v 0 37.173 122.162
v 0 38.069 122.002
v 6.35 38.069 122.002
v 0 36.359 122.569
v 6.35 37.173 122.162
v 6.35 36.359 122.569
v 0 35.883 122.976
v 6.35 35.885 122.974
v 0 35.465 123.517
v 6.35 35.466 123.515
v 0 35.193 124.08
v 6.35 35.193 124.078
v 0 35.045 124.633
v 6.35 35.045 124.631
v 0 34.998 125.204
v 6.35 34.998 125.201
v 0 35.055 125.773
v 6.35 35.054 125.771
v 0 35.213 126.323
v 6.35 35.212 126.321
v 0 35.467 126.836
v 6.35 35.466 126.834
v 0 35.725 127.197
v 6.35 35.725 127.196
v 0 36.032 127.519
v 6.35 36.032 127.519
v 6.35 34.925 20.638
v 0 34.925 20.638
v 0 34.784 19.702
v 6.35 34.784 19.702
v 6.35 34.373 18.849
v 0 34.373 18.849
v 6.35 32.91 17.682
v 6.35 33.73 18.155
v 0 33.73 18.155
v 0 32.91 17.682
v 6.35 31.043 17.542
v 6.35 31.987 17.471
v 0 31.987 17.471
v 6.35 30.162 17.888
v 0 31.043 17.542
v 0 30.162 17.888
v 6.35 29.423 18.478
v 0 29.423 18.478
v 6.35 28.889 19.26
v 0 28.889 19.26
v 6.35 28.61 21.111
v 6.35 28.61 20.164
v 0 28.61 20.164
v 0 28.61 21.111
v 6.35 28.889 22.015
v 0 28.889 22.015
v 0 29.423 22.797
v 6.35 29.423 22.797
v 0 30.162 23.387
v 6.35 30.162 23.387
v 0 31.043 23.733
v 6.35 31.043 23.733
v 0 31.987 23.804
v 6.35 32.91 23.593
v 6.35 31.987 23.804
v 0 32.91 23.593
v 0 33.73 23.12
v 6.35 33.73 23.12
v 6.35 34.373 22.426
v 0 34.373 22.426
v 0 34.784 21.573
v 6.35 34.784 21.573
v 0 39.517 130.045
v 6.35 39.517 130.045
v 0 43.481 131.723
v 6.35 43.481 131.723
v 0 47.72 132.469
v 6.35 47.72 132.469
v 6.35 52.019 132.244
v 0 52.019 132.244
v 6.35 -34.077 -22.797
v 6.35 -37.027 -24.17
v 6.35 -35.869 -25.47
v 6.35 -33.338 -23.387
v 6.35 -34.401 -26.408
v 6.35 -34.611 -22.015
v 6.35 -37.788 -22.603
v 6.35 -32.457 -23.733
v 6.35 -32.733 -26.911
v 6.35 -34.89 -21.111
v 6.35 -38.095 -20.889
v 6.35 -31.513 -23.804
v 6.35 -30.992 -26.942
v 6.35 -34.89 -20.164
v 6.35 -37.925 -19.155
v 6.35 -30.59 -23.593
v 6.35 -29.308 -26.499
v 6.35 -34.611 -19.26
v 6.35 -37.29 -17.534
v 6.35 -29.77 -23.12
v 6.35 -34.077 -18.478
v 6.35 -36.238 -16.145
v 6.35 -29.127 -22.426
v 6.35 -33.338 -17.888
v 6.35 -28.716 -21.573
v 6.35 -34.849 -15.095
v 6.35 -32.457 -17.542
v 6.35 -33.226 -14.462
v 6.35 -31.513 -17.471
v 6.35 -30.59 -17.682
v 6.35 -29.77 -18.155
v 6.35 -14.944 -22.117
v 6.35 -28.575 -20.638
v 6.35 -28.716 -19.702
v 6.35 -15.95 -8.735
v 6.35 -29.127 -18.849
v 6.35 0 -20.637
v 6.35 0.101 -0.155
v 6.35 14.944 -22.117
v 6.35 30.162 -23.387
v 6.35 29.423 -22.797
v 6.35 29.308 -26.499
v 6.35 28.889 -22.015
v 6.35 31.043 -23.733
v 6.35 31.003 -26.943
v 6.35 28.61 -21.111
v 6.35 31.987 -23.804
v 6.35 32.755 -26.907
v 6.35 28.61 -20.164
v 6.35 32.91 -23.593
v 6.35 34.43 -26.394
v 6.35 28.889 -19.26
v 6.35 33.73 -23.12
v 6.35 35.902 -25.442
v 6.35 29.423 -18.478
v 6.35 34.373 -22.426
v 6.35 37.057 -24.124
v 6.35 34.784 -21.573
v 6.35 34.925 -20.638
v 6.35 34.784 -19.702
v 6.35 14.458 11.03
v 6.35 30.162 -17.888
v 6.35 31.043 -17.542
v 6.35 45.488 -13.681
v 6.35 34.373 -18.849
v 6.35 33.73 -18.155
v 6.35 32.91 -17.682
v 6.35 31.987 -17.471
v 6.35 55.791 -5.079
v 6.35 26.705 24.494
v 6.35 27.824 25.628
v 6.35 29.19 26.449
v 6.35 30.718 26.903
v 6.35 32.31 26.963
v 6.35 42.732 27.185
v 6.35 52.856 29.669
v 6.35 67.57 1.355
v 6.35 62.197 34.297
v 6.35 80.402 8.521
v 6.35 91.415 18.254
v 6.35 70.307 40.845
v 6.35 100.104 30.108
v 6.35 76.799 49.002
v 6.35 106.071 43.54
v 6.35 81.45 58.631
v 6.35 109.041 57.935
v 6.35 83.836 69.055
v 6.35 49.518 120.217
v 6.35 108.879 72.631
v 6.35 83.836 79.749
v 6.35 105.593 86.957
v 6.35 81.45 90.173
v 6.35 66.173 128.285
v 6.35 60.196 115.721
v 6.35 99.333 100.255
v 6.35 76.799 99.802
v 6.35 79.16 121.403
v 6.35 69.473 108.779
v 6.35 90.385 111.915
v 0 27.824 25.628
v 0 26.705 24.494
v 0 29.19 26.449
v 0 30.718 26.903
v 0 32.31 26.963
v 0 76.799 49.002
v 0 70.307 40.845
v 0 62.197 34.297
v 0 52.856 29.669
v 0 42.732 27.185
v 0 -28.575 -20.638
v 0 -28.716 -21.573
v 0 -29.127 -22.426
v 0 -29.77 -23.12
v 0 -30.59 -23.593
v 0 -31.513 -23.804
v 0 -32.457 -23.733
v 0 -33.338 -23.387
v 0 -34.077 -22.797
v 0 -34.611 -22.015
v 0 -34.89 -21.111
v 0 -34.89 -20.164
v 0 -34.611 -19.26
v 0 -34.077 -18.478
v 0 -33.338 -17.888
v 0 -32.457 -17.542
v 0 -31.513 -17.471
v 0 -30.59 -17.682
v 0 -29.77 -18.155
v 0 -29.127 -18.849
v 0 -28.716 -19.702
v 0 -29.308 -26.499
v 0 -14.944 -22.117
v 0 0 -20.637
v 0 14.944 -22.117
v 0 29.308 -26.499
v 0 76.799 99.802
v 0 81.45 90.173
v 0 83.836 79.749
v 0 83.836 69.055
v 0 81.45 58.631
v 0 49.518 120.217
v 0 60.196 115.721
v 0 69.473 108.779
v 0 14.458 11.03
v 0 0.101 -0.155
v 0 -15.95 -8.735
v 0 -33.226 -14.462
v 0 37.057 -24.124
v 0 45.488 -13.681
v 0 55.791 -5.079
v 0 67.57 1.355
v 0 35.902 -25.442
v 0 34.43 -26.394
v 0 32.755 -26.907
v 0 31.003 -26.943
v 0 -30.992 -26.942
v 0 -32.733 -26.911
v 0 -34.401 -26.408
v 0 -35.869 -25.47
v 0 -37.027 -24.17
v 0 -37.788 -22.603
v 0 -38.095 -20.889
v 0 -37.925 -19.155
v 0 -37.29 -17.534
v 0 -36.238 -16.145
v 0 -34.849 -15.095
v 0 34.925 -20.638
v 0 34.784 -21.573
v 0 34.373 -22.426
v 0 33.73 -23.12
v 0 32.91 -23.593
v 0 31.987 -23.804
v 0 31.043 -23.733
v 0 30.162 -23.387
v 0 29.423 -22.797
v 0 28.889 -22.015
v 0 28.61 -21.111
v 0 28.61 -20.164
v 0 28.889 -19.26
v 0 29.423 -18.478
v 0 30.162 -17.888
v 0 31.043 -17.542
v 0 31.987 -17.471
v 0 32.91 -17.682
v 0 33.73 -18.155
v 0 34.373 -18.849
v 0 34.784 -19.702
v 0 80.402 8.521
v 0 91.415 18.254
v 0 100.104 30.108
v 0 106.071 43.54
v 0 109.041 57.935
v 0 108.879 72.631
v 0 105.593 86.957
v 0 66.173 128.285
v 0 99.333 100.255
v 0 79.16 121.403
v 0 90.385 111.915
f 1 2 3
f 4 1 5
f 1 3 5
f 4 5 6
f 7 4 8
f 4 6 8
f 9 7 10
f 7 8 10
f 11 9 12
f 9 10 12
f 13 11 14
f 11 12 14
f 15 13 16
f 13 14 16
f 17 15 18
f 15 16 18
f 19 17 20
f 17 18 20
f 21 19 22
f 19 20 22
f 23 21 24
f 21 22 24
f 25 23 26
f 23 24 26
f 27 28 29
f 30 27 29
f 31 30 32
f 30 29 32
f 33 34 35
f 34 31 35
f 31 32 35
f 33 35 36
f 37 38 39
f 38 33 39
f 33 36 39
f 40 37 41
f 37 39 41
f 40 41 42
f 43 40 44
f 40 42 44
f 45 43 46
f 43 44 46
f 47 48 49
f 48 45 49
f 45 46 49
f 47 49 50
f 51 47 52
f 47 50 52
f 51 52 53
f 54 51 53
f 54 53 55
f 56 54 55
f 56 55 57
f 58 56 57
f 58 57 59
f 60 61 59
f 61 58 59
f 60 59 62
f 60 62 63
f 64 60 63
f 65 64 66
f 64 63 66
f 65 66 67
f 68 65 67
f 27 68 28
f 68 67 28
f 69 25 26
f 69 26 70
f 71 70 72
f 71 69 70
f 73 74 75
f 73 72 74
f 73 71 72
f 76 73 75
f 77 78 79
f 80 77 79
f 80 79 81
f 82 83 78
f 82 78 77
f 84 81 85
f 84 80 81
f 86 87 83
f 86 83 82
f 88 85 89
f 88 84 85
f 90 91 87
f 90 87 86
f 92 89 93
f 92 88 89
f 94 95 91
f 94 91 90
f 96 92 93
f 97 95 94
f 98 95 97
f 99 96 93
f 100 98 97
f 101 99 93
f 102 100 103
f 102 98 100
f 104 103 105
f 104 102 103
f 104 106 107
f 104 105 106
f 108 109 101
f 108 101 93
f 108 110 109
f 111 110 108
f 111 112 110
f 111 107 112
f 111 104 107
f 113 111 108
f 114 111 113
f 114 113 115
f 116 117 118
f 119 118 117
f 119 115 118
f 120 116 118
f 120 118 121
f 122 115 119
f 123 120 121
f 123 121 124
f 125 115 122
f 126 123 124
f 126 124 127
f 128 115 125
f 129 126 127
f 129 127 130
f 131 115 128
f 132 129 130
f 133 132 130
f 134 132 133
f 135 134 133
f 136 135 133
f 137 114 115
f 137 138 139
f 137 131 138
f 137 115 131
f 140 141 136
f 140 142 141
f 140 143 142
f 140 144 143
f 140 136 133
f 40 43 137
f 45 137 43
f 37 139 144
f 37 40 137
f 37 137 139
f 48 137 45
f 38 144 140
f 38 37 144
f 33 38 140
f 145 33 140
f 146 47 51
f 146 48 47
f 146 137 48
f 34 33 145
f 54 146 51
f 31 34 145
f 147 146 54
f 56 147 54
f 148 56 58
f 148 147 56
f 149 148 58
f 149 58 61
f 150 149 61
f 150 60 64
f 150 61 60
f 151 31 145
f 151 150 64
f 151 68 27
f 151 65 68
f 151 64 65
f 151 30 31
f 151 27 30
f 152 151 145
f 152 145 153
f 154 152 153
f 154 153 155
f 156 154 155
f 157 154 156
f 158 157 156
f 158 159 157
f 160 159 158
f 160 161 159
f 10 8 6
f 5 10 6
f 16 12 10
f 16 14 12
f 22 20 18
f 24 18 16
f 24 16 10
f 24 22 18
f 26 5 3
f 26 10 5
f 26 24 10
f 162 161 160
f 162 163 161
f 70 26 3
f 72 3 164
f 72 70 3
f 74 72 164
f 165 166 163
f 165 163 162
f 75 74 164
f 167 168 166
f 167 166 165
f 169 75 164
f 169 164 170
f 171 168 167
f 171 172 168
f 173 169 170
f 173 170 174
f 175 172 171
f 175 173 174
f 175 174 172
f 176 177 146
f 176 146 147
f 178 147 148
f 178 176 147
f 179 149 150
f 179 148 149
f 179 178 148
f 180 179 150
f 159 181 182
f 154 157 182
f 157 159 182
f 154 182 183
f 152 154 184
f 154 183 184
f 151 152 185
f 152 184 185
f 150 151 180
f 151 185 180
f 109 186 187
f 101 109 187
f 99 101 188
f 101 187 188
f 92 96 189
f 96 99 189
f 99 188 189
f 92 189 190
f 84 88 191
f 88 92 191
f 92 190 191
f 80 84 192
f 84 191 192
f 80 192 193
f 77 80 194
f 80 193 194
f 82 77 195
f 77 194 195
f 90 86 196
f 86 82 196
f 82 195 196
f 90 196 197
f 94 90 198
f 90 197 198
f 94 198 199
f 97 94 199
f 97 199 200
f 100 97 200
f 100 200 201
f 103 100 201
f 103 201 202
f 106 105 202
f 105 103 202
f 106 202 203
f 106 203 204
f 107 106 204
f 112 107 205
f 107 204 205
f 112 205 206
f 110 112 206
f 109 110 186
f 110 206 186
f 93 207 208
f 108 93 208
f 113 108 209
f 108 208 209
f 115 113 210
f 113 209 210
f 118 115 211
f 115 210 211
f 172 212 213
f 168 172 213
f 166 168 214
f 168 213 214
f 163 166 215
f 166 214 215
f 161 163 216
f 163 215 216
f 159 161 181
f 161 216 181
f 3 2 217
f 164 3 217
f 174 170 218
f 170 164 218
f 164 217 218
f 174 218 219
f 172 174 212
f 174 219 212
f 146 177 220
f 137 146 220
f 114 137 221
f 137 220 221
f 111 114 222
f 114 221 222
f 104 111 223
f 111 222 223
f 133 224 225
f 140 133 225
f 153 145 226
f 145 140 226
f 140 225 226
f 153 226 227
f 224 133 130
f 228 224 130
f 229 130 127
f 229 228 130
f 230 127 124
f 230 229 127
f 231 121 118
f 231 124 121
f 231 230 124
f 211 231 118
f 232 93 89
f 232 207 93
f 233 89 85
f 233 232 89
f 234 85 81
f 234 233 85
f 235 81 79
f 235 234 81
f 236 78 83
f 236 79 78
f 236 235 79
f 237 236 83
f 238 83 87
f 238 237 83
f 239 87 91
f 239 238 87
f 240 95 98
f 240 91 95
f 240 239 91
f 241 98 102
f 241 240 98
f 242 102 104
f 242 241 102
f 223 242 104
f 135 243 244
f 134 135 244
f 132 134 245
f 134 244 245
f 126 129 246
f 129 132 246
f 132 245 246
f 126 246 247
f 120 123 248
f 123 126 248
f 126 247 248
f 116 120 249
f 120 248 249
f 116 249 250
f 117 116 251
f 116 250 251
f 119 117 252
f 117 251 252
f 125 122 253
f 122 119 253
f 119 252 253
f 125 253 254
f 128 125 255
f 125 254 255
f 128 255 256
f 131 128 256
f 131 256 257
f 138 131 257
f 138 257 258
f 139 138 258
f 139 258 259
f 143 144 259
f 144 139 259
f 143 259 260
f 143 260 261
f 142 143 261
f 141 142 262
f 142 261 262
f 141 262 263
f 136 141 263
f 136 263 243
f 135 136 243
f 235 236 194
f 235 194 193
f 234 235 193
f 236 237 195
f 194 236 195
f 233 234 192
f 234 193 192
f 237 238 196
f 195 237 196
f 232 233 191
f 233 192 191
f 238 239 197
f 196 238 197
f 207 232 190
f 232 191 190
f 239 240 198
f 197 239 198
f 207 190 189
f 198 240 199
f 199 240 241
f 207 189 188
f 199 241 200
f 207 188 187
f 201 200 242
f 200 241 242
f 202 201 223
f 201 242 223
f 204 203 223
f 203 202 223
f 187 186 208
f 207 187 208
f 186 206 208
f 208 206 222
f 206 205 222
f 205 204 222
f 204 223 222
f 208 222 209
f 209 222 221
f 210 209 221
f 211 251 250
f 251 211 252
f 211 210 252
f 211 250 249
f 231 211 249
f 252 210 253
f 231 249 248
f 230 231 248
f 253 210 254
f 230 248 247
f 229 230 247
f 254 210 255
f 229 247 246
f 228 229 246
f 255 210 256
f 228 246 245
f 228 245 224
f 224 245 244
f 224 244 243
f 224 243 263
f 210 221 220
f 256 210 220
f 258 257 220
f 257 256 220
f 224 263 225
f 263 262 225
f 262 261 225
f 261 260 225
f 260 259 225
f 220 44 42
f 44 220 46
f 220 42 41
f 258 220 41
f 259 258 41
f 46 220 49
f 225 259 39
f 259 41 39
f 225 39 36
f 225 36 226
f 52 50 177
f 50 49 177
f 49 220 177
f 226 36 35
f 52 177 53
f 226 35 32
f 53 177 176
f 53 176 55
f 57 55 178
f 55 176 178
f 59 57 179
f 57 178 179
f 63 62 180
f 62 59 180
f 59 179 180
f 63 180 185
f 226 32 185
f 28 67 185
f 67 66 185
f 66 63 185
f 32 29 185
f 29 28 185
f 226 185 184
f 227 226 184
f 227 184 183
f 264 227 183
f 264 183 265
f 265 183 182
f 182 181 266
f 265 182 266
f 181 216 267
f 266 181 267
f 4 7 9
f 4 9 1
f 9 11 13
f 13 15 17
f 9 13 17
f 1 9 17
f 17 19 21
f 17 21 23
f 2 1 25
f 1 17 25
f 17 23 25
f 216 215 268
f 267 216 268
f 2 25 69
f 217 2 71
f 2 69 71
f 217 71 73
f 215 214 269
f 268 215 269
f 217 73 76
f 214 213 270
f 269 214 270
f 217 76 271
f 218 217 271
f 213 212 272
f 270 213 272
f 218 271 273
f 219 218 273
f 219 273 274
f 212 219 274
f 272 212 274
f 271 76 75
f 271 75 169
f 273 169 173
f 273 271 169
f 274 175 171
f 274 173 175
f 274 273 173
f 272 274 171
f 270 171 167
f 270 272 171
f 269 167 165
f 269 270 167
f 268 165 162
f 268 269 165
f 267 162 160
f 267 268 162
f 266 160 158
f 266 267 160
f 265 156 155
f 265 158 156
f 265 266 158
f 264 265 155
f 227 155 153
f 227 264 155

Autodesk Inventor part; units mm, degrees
ref_plane "YZ Plane" through (0, 0, 0) normal (1, 0, 0) x (0, 1, 0)
ref_plane "XZ Plane" through (0, 0, 0) normal (0, 1, 0) x (-1, 0, 0)
ref_plane "XY Plane" through (0, 0, 0) normal (0, 0, 1) x (1, 0, 0)
sketch "Sketch1" plane through (0, 0, 0) normal (1, 0, 0) x (0, 1, 0)
  line L0 (31.75, 0) -> (-31.75, 0) construction
  line L1 (-31.75, 0) -> (-31.75, -20.6375) construction
  line L2 (31.75, -20.6375) -> (31.75, 20.6375) construction
  circle A0 centre (31.75, -20.6375) radius 3.175
  circle A1 centre (31.75, 20.6375) radius 3.175
  circle A2 centre (-31.75, -20.6375) radius 3.175
  arc A3 (32.3103, 26.9627) -> (31.75, 121.7883) centre (36.5125, 74.402) ccw
  arc A4 (32.3103, 26.9627) -> (26.7051, 24.4939) centre (31.75, 20.6375) ccw
  arc A5 (-33.2262, -14.4615) -> (-29.3077, -26.499) centre (-31.75, -20.6375) ccw
  arc A6 (-33.2262, -14.4615) -> (26.7051, 24.4939) centre (-58.0173, 89.2573) ccw
  arc A7 (29.3077, -26.499) -> (37.057, -24.1244) centre (31.75, -20.6375) ccw
  arc A8 (29.3077, -26.499) -> (-29.3077, -26.499) centre (0, -96.8375) ccw
  line L3 (51.3987, 74.402) -> (36.5125, 74.402) construction
  arc A9 (52.0189, 132.2442) -> (31.75, 121.7883) centre (48.8804, 113.4545) ccw
  arc A10 (67.5698, 1.3552) -> (52.0189, 132.2442) centre (40.7089, 64.5321) ccw
  line L4 (48.8804, 113.4545) -> (50.8914, 119.8045) construction
  line L5 (67.5698, 1.3552) -> (55.1469, 30.5739) construction
  line L6 (-29.3077, -26.499) -> (-33.2262, -14.4615) construction
  line L7 (31.75, -20.6375) -> (-31.75, -20.6375) construction
  line L8 (25.9987, 99.802) -> (76.7987, 99.802)
  line L9 (76.7987, 99.802) -> (76.7987, 49.002)
  line L10 (76.7987, 49.002) -> (25.9987, 49.002)
  line L11 (25.9987, 49.002) -> (25.9987, 99.802)
  line L12 (25.9987, 99.802) -> (76.7987, 49.002) construction
  line L13 (76.7987, 99.802) -> (25.9987, 49.002) construction
  line L14 (48.8444, 120.4027) -> (52.0189, 132.2442) construction
  arc A11 (67.5698, 1.3552) -> (37.057, -24.1244) centre (94.4307, -61.8218) ccw
  point P0 (0, 0)
  point P1 (0, 0)
  point P2 (51.3987, 74.402)
  point P3 (51.3987, 74.402)
  dimension "d0" = 63.5
  dimension "d1" = 41.275
  dimension "d2" = 6.35
  dimension "d4" = 6.35
  dimension "d6" = 95.25
  dimension "d8" = 4.7625
  dimension "d9" = 19.05
  dimension "d10" = 6.35
  dimension "d12" = 31.75
  dimension "d21" = 50.8
  dimension "d24" = 0.508
extrude "Extrusion1" add sketch "Sketch1" along normal blind 6.35 contours A3 A9 A10 A11 A7 A8 A5 A6 A4
fillet "Fillet2" radius 3.175 1 edges at (3.175, 31.75, 121.7883)
properties part number "climb hook" material "Aluminum 6061"
